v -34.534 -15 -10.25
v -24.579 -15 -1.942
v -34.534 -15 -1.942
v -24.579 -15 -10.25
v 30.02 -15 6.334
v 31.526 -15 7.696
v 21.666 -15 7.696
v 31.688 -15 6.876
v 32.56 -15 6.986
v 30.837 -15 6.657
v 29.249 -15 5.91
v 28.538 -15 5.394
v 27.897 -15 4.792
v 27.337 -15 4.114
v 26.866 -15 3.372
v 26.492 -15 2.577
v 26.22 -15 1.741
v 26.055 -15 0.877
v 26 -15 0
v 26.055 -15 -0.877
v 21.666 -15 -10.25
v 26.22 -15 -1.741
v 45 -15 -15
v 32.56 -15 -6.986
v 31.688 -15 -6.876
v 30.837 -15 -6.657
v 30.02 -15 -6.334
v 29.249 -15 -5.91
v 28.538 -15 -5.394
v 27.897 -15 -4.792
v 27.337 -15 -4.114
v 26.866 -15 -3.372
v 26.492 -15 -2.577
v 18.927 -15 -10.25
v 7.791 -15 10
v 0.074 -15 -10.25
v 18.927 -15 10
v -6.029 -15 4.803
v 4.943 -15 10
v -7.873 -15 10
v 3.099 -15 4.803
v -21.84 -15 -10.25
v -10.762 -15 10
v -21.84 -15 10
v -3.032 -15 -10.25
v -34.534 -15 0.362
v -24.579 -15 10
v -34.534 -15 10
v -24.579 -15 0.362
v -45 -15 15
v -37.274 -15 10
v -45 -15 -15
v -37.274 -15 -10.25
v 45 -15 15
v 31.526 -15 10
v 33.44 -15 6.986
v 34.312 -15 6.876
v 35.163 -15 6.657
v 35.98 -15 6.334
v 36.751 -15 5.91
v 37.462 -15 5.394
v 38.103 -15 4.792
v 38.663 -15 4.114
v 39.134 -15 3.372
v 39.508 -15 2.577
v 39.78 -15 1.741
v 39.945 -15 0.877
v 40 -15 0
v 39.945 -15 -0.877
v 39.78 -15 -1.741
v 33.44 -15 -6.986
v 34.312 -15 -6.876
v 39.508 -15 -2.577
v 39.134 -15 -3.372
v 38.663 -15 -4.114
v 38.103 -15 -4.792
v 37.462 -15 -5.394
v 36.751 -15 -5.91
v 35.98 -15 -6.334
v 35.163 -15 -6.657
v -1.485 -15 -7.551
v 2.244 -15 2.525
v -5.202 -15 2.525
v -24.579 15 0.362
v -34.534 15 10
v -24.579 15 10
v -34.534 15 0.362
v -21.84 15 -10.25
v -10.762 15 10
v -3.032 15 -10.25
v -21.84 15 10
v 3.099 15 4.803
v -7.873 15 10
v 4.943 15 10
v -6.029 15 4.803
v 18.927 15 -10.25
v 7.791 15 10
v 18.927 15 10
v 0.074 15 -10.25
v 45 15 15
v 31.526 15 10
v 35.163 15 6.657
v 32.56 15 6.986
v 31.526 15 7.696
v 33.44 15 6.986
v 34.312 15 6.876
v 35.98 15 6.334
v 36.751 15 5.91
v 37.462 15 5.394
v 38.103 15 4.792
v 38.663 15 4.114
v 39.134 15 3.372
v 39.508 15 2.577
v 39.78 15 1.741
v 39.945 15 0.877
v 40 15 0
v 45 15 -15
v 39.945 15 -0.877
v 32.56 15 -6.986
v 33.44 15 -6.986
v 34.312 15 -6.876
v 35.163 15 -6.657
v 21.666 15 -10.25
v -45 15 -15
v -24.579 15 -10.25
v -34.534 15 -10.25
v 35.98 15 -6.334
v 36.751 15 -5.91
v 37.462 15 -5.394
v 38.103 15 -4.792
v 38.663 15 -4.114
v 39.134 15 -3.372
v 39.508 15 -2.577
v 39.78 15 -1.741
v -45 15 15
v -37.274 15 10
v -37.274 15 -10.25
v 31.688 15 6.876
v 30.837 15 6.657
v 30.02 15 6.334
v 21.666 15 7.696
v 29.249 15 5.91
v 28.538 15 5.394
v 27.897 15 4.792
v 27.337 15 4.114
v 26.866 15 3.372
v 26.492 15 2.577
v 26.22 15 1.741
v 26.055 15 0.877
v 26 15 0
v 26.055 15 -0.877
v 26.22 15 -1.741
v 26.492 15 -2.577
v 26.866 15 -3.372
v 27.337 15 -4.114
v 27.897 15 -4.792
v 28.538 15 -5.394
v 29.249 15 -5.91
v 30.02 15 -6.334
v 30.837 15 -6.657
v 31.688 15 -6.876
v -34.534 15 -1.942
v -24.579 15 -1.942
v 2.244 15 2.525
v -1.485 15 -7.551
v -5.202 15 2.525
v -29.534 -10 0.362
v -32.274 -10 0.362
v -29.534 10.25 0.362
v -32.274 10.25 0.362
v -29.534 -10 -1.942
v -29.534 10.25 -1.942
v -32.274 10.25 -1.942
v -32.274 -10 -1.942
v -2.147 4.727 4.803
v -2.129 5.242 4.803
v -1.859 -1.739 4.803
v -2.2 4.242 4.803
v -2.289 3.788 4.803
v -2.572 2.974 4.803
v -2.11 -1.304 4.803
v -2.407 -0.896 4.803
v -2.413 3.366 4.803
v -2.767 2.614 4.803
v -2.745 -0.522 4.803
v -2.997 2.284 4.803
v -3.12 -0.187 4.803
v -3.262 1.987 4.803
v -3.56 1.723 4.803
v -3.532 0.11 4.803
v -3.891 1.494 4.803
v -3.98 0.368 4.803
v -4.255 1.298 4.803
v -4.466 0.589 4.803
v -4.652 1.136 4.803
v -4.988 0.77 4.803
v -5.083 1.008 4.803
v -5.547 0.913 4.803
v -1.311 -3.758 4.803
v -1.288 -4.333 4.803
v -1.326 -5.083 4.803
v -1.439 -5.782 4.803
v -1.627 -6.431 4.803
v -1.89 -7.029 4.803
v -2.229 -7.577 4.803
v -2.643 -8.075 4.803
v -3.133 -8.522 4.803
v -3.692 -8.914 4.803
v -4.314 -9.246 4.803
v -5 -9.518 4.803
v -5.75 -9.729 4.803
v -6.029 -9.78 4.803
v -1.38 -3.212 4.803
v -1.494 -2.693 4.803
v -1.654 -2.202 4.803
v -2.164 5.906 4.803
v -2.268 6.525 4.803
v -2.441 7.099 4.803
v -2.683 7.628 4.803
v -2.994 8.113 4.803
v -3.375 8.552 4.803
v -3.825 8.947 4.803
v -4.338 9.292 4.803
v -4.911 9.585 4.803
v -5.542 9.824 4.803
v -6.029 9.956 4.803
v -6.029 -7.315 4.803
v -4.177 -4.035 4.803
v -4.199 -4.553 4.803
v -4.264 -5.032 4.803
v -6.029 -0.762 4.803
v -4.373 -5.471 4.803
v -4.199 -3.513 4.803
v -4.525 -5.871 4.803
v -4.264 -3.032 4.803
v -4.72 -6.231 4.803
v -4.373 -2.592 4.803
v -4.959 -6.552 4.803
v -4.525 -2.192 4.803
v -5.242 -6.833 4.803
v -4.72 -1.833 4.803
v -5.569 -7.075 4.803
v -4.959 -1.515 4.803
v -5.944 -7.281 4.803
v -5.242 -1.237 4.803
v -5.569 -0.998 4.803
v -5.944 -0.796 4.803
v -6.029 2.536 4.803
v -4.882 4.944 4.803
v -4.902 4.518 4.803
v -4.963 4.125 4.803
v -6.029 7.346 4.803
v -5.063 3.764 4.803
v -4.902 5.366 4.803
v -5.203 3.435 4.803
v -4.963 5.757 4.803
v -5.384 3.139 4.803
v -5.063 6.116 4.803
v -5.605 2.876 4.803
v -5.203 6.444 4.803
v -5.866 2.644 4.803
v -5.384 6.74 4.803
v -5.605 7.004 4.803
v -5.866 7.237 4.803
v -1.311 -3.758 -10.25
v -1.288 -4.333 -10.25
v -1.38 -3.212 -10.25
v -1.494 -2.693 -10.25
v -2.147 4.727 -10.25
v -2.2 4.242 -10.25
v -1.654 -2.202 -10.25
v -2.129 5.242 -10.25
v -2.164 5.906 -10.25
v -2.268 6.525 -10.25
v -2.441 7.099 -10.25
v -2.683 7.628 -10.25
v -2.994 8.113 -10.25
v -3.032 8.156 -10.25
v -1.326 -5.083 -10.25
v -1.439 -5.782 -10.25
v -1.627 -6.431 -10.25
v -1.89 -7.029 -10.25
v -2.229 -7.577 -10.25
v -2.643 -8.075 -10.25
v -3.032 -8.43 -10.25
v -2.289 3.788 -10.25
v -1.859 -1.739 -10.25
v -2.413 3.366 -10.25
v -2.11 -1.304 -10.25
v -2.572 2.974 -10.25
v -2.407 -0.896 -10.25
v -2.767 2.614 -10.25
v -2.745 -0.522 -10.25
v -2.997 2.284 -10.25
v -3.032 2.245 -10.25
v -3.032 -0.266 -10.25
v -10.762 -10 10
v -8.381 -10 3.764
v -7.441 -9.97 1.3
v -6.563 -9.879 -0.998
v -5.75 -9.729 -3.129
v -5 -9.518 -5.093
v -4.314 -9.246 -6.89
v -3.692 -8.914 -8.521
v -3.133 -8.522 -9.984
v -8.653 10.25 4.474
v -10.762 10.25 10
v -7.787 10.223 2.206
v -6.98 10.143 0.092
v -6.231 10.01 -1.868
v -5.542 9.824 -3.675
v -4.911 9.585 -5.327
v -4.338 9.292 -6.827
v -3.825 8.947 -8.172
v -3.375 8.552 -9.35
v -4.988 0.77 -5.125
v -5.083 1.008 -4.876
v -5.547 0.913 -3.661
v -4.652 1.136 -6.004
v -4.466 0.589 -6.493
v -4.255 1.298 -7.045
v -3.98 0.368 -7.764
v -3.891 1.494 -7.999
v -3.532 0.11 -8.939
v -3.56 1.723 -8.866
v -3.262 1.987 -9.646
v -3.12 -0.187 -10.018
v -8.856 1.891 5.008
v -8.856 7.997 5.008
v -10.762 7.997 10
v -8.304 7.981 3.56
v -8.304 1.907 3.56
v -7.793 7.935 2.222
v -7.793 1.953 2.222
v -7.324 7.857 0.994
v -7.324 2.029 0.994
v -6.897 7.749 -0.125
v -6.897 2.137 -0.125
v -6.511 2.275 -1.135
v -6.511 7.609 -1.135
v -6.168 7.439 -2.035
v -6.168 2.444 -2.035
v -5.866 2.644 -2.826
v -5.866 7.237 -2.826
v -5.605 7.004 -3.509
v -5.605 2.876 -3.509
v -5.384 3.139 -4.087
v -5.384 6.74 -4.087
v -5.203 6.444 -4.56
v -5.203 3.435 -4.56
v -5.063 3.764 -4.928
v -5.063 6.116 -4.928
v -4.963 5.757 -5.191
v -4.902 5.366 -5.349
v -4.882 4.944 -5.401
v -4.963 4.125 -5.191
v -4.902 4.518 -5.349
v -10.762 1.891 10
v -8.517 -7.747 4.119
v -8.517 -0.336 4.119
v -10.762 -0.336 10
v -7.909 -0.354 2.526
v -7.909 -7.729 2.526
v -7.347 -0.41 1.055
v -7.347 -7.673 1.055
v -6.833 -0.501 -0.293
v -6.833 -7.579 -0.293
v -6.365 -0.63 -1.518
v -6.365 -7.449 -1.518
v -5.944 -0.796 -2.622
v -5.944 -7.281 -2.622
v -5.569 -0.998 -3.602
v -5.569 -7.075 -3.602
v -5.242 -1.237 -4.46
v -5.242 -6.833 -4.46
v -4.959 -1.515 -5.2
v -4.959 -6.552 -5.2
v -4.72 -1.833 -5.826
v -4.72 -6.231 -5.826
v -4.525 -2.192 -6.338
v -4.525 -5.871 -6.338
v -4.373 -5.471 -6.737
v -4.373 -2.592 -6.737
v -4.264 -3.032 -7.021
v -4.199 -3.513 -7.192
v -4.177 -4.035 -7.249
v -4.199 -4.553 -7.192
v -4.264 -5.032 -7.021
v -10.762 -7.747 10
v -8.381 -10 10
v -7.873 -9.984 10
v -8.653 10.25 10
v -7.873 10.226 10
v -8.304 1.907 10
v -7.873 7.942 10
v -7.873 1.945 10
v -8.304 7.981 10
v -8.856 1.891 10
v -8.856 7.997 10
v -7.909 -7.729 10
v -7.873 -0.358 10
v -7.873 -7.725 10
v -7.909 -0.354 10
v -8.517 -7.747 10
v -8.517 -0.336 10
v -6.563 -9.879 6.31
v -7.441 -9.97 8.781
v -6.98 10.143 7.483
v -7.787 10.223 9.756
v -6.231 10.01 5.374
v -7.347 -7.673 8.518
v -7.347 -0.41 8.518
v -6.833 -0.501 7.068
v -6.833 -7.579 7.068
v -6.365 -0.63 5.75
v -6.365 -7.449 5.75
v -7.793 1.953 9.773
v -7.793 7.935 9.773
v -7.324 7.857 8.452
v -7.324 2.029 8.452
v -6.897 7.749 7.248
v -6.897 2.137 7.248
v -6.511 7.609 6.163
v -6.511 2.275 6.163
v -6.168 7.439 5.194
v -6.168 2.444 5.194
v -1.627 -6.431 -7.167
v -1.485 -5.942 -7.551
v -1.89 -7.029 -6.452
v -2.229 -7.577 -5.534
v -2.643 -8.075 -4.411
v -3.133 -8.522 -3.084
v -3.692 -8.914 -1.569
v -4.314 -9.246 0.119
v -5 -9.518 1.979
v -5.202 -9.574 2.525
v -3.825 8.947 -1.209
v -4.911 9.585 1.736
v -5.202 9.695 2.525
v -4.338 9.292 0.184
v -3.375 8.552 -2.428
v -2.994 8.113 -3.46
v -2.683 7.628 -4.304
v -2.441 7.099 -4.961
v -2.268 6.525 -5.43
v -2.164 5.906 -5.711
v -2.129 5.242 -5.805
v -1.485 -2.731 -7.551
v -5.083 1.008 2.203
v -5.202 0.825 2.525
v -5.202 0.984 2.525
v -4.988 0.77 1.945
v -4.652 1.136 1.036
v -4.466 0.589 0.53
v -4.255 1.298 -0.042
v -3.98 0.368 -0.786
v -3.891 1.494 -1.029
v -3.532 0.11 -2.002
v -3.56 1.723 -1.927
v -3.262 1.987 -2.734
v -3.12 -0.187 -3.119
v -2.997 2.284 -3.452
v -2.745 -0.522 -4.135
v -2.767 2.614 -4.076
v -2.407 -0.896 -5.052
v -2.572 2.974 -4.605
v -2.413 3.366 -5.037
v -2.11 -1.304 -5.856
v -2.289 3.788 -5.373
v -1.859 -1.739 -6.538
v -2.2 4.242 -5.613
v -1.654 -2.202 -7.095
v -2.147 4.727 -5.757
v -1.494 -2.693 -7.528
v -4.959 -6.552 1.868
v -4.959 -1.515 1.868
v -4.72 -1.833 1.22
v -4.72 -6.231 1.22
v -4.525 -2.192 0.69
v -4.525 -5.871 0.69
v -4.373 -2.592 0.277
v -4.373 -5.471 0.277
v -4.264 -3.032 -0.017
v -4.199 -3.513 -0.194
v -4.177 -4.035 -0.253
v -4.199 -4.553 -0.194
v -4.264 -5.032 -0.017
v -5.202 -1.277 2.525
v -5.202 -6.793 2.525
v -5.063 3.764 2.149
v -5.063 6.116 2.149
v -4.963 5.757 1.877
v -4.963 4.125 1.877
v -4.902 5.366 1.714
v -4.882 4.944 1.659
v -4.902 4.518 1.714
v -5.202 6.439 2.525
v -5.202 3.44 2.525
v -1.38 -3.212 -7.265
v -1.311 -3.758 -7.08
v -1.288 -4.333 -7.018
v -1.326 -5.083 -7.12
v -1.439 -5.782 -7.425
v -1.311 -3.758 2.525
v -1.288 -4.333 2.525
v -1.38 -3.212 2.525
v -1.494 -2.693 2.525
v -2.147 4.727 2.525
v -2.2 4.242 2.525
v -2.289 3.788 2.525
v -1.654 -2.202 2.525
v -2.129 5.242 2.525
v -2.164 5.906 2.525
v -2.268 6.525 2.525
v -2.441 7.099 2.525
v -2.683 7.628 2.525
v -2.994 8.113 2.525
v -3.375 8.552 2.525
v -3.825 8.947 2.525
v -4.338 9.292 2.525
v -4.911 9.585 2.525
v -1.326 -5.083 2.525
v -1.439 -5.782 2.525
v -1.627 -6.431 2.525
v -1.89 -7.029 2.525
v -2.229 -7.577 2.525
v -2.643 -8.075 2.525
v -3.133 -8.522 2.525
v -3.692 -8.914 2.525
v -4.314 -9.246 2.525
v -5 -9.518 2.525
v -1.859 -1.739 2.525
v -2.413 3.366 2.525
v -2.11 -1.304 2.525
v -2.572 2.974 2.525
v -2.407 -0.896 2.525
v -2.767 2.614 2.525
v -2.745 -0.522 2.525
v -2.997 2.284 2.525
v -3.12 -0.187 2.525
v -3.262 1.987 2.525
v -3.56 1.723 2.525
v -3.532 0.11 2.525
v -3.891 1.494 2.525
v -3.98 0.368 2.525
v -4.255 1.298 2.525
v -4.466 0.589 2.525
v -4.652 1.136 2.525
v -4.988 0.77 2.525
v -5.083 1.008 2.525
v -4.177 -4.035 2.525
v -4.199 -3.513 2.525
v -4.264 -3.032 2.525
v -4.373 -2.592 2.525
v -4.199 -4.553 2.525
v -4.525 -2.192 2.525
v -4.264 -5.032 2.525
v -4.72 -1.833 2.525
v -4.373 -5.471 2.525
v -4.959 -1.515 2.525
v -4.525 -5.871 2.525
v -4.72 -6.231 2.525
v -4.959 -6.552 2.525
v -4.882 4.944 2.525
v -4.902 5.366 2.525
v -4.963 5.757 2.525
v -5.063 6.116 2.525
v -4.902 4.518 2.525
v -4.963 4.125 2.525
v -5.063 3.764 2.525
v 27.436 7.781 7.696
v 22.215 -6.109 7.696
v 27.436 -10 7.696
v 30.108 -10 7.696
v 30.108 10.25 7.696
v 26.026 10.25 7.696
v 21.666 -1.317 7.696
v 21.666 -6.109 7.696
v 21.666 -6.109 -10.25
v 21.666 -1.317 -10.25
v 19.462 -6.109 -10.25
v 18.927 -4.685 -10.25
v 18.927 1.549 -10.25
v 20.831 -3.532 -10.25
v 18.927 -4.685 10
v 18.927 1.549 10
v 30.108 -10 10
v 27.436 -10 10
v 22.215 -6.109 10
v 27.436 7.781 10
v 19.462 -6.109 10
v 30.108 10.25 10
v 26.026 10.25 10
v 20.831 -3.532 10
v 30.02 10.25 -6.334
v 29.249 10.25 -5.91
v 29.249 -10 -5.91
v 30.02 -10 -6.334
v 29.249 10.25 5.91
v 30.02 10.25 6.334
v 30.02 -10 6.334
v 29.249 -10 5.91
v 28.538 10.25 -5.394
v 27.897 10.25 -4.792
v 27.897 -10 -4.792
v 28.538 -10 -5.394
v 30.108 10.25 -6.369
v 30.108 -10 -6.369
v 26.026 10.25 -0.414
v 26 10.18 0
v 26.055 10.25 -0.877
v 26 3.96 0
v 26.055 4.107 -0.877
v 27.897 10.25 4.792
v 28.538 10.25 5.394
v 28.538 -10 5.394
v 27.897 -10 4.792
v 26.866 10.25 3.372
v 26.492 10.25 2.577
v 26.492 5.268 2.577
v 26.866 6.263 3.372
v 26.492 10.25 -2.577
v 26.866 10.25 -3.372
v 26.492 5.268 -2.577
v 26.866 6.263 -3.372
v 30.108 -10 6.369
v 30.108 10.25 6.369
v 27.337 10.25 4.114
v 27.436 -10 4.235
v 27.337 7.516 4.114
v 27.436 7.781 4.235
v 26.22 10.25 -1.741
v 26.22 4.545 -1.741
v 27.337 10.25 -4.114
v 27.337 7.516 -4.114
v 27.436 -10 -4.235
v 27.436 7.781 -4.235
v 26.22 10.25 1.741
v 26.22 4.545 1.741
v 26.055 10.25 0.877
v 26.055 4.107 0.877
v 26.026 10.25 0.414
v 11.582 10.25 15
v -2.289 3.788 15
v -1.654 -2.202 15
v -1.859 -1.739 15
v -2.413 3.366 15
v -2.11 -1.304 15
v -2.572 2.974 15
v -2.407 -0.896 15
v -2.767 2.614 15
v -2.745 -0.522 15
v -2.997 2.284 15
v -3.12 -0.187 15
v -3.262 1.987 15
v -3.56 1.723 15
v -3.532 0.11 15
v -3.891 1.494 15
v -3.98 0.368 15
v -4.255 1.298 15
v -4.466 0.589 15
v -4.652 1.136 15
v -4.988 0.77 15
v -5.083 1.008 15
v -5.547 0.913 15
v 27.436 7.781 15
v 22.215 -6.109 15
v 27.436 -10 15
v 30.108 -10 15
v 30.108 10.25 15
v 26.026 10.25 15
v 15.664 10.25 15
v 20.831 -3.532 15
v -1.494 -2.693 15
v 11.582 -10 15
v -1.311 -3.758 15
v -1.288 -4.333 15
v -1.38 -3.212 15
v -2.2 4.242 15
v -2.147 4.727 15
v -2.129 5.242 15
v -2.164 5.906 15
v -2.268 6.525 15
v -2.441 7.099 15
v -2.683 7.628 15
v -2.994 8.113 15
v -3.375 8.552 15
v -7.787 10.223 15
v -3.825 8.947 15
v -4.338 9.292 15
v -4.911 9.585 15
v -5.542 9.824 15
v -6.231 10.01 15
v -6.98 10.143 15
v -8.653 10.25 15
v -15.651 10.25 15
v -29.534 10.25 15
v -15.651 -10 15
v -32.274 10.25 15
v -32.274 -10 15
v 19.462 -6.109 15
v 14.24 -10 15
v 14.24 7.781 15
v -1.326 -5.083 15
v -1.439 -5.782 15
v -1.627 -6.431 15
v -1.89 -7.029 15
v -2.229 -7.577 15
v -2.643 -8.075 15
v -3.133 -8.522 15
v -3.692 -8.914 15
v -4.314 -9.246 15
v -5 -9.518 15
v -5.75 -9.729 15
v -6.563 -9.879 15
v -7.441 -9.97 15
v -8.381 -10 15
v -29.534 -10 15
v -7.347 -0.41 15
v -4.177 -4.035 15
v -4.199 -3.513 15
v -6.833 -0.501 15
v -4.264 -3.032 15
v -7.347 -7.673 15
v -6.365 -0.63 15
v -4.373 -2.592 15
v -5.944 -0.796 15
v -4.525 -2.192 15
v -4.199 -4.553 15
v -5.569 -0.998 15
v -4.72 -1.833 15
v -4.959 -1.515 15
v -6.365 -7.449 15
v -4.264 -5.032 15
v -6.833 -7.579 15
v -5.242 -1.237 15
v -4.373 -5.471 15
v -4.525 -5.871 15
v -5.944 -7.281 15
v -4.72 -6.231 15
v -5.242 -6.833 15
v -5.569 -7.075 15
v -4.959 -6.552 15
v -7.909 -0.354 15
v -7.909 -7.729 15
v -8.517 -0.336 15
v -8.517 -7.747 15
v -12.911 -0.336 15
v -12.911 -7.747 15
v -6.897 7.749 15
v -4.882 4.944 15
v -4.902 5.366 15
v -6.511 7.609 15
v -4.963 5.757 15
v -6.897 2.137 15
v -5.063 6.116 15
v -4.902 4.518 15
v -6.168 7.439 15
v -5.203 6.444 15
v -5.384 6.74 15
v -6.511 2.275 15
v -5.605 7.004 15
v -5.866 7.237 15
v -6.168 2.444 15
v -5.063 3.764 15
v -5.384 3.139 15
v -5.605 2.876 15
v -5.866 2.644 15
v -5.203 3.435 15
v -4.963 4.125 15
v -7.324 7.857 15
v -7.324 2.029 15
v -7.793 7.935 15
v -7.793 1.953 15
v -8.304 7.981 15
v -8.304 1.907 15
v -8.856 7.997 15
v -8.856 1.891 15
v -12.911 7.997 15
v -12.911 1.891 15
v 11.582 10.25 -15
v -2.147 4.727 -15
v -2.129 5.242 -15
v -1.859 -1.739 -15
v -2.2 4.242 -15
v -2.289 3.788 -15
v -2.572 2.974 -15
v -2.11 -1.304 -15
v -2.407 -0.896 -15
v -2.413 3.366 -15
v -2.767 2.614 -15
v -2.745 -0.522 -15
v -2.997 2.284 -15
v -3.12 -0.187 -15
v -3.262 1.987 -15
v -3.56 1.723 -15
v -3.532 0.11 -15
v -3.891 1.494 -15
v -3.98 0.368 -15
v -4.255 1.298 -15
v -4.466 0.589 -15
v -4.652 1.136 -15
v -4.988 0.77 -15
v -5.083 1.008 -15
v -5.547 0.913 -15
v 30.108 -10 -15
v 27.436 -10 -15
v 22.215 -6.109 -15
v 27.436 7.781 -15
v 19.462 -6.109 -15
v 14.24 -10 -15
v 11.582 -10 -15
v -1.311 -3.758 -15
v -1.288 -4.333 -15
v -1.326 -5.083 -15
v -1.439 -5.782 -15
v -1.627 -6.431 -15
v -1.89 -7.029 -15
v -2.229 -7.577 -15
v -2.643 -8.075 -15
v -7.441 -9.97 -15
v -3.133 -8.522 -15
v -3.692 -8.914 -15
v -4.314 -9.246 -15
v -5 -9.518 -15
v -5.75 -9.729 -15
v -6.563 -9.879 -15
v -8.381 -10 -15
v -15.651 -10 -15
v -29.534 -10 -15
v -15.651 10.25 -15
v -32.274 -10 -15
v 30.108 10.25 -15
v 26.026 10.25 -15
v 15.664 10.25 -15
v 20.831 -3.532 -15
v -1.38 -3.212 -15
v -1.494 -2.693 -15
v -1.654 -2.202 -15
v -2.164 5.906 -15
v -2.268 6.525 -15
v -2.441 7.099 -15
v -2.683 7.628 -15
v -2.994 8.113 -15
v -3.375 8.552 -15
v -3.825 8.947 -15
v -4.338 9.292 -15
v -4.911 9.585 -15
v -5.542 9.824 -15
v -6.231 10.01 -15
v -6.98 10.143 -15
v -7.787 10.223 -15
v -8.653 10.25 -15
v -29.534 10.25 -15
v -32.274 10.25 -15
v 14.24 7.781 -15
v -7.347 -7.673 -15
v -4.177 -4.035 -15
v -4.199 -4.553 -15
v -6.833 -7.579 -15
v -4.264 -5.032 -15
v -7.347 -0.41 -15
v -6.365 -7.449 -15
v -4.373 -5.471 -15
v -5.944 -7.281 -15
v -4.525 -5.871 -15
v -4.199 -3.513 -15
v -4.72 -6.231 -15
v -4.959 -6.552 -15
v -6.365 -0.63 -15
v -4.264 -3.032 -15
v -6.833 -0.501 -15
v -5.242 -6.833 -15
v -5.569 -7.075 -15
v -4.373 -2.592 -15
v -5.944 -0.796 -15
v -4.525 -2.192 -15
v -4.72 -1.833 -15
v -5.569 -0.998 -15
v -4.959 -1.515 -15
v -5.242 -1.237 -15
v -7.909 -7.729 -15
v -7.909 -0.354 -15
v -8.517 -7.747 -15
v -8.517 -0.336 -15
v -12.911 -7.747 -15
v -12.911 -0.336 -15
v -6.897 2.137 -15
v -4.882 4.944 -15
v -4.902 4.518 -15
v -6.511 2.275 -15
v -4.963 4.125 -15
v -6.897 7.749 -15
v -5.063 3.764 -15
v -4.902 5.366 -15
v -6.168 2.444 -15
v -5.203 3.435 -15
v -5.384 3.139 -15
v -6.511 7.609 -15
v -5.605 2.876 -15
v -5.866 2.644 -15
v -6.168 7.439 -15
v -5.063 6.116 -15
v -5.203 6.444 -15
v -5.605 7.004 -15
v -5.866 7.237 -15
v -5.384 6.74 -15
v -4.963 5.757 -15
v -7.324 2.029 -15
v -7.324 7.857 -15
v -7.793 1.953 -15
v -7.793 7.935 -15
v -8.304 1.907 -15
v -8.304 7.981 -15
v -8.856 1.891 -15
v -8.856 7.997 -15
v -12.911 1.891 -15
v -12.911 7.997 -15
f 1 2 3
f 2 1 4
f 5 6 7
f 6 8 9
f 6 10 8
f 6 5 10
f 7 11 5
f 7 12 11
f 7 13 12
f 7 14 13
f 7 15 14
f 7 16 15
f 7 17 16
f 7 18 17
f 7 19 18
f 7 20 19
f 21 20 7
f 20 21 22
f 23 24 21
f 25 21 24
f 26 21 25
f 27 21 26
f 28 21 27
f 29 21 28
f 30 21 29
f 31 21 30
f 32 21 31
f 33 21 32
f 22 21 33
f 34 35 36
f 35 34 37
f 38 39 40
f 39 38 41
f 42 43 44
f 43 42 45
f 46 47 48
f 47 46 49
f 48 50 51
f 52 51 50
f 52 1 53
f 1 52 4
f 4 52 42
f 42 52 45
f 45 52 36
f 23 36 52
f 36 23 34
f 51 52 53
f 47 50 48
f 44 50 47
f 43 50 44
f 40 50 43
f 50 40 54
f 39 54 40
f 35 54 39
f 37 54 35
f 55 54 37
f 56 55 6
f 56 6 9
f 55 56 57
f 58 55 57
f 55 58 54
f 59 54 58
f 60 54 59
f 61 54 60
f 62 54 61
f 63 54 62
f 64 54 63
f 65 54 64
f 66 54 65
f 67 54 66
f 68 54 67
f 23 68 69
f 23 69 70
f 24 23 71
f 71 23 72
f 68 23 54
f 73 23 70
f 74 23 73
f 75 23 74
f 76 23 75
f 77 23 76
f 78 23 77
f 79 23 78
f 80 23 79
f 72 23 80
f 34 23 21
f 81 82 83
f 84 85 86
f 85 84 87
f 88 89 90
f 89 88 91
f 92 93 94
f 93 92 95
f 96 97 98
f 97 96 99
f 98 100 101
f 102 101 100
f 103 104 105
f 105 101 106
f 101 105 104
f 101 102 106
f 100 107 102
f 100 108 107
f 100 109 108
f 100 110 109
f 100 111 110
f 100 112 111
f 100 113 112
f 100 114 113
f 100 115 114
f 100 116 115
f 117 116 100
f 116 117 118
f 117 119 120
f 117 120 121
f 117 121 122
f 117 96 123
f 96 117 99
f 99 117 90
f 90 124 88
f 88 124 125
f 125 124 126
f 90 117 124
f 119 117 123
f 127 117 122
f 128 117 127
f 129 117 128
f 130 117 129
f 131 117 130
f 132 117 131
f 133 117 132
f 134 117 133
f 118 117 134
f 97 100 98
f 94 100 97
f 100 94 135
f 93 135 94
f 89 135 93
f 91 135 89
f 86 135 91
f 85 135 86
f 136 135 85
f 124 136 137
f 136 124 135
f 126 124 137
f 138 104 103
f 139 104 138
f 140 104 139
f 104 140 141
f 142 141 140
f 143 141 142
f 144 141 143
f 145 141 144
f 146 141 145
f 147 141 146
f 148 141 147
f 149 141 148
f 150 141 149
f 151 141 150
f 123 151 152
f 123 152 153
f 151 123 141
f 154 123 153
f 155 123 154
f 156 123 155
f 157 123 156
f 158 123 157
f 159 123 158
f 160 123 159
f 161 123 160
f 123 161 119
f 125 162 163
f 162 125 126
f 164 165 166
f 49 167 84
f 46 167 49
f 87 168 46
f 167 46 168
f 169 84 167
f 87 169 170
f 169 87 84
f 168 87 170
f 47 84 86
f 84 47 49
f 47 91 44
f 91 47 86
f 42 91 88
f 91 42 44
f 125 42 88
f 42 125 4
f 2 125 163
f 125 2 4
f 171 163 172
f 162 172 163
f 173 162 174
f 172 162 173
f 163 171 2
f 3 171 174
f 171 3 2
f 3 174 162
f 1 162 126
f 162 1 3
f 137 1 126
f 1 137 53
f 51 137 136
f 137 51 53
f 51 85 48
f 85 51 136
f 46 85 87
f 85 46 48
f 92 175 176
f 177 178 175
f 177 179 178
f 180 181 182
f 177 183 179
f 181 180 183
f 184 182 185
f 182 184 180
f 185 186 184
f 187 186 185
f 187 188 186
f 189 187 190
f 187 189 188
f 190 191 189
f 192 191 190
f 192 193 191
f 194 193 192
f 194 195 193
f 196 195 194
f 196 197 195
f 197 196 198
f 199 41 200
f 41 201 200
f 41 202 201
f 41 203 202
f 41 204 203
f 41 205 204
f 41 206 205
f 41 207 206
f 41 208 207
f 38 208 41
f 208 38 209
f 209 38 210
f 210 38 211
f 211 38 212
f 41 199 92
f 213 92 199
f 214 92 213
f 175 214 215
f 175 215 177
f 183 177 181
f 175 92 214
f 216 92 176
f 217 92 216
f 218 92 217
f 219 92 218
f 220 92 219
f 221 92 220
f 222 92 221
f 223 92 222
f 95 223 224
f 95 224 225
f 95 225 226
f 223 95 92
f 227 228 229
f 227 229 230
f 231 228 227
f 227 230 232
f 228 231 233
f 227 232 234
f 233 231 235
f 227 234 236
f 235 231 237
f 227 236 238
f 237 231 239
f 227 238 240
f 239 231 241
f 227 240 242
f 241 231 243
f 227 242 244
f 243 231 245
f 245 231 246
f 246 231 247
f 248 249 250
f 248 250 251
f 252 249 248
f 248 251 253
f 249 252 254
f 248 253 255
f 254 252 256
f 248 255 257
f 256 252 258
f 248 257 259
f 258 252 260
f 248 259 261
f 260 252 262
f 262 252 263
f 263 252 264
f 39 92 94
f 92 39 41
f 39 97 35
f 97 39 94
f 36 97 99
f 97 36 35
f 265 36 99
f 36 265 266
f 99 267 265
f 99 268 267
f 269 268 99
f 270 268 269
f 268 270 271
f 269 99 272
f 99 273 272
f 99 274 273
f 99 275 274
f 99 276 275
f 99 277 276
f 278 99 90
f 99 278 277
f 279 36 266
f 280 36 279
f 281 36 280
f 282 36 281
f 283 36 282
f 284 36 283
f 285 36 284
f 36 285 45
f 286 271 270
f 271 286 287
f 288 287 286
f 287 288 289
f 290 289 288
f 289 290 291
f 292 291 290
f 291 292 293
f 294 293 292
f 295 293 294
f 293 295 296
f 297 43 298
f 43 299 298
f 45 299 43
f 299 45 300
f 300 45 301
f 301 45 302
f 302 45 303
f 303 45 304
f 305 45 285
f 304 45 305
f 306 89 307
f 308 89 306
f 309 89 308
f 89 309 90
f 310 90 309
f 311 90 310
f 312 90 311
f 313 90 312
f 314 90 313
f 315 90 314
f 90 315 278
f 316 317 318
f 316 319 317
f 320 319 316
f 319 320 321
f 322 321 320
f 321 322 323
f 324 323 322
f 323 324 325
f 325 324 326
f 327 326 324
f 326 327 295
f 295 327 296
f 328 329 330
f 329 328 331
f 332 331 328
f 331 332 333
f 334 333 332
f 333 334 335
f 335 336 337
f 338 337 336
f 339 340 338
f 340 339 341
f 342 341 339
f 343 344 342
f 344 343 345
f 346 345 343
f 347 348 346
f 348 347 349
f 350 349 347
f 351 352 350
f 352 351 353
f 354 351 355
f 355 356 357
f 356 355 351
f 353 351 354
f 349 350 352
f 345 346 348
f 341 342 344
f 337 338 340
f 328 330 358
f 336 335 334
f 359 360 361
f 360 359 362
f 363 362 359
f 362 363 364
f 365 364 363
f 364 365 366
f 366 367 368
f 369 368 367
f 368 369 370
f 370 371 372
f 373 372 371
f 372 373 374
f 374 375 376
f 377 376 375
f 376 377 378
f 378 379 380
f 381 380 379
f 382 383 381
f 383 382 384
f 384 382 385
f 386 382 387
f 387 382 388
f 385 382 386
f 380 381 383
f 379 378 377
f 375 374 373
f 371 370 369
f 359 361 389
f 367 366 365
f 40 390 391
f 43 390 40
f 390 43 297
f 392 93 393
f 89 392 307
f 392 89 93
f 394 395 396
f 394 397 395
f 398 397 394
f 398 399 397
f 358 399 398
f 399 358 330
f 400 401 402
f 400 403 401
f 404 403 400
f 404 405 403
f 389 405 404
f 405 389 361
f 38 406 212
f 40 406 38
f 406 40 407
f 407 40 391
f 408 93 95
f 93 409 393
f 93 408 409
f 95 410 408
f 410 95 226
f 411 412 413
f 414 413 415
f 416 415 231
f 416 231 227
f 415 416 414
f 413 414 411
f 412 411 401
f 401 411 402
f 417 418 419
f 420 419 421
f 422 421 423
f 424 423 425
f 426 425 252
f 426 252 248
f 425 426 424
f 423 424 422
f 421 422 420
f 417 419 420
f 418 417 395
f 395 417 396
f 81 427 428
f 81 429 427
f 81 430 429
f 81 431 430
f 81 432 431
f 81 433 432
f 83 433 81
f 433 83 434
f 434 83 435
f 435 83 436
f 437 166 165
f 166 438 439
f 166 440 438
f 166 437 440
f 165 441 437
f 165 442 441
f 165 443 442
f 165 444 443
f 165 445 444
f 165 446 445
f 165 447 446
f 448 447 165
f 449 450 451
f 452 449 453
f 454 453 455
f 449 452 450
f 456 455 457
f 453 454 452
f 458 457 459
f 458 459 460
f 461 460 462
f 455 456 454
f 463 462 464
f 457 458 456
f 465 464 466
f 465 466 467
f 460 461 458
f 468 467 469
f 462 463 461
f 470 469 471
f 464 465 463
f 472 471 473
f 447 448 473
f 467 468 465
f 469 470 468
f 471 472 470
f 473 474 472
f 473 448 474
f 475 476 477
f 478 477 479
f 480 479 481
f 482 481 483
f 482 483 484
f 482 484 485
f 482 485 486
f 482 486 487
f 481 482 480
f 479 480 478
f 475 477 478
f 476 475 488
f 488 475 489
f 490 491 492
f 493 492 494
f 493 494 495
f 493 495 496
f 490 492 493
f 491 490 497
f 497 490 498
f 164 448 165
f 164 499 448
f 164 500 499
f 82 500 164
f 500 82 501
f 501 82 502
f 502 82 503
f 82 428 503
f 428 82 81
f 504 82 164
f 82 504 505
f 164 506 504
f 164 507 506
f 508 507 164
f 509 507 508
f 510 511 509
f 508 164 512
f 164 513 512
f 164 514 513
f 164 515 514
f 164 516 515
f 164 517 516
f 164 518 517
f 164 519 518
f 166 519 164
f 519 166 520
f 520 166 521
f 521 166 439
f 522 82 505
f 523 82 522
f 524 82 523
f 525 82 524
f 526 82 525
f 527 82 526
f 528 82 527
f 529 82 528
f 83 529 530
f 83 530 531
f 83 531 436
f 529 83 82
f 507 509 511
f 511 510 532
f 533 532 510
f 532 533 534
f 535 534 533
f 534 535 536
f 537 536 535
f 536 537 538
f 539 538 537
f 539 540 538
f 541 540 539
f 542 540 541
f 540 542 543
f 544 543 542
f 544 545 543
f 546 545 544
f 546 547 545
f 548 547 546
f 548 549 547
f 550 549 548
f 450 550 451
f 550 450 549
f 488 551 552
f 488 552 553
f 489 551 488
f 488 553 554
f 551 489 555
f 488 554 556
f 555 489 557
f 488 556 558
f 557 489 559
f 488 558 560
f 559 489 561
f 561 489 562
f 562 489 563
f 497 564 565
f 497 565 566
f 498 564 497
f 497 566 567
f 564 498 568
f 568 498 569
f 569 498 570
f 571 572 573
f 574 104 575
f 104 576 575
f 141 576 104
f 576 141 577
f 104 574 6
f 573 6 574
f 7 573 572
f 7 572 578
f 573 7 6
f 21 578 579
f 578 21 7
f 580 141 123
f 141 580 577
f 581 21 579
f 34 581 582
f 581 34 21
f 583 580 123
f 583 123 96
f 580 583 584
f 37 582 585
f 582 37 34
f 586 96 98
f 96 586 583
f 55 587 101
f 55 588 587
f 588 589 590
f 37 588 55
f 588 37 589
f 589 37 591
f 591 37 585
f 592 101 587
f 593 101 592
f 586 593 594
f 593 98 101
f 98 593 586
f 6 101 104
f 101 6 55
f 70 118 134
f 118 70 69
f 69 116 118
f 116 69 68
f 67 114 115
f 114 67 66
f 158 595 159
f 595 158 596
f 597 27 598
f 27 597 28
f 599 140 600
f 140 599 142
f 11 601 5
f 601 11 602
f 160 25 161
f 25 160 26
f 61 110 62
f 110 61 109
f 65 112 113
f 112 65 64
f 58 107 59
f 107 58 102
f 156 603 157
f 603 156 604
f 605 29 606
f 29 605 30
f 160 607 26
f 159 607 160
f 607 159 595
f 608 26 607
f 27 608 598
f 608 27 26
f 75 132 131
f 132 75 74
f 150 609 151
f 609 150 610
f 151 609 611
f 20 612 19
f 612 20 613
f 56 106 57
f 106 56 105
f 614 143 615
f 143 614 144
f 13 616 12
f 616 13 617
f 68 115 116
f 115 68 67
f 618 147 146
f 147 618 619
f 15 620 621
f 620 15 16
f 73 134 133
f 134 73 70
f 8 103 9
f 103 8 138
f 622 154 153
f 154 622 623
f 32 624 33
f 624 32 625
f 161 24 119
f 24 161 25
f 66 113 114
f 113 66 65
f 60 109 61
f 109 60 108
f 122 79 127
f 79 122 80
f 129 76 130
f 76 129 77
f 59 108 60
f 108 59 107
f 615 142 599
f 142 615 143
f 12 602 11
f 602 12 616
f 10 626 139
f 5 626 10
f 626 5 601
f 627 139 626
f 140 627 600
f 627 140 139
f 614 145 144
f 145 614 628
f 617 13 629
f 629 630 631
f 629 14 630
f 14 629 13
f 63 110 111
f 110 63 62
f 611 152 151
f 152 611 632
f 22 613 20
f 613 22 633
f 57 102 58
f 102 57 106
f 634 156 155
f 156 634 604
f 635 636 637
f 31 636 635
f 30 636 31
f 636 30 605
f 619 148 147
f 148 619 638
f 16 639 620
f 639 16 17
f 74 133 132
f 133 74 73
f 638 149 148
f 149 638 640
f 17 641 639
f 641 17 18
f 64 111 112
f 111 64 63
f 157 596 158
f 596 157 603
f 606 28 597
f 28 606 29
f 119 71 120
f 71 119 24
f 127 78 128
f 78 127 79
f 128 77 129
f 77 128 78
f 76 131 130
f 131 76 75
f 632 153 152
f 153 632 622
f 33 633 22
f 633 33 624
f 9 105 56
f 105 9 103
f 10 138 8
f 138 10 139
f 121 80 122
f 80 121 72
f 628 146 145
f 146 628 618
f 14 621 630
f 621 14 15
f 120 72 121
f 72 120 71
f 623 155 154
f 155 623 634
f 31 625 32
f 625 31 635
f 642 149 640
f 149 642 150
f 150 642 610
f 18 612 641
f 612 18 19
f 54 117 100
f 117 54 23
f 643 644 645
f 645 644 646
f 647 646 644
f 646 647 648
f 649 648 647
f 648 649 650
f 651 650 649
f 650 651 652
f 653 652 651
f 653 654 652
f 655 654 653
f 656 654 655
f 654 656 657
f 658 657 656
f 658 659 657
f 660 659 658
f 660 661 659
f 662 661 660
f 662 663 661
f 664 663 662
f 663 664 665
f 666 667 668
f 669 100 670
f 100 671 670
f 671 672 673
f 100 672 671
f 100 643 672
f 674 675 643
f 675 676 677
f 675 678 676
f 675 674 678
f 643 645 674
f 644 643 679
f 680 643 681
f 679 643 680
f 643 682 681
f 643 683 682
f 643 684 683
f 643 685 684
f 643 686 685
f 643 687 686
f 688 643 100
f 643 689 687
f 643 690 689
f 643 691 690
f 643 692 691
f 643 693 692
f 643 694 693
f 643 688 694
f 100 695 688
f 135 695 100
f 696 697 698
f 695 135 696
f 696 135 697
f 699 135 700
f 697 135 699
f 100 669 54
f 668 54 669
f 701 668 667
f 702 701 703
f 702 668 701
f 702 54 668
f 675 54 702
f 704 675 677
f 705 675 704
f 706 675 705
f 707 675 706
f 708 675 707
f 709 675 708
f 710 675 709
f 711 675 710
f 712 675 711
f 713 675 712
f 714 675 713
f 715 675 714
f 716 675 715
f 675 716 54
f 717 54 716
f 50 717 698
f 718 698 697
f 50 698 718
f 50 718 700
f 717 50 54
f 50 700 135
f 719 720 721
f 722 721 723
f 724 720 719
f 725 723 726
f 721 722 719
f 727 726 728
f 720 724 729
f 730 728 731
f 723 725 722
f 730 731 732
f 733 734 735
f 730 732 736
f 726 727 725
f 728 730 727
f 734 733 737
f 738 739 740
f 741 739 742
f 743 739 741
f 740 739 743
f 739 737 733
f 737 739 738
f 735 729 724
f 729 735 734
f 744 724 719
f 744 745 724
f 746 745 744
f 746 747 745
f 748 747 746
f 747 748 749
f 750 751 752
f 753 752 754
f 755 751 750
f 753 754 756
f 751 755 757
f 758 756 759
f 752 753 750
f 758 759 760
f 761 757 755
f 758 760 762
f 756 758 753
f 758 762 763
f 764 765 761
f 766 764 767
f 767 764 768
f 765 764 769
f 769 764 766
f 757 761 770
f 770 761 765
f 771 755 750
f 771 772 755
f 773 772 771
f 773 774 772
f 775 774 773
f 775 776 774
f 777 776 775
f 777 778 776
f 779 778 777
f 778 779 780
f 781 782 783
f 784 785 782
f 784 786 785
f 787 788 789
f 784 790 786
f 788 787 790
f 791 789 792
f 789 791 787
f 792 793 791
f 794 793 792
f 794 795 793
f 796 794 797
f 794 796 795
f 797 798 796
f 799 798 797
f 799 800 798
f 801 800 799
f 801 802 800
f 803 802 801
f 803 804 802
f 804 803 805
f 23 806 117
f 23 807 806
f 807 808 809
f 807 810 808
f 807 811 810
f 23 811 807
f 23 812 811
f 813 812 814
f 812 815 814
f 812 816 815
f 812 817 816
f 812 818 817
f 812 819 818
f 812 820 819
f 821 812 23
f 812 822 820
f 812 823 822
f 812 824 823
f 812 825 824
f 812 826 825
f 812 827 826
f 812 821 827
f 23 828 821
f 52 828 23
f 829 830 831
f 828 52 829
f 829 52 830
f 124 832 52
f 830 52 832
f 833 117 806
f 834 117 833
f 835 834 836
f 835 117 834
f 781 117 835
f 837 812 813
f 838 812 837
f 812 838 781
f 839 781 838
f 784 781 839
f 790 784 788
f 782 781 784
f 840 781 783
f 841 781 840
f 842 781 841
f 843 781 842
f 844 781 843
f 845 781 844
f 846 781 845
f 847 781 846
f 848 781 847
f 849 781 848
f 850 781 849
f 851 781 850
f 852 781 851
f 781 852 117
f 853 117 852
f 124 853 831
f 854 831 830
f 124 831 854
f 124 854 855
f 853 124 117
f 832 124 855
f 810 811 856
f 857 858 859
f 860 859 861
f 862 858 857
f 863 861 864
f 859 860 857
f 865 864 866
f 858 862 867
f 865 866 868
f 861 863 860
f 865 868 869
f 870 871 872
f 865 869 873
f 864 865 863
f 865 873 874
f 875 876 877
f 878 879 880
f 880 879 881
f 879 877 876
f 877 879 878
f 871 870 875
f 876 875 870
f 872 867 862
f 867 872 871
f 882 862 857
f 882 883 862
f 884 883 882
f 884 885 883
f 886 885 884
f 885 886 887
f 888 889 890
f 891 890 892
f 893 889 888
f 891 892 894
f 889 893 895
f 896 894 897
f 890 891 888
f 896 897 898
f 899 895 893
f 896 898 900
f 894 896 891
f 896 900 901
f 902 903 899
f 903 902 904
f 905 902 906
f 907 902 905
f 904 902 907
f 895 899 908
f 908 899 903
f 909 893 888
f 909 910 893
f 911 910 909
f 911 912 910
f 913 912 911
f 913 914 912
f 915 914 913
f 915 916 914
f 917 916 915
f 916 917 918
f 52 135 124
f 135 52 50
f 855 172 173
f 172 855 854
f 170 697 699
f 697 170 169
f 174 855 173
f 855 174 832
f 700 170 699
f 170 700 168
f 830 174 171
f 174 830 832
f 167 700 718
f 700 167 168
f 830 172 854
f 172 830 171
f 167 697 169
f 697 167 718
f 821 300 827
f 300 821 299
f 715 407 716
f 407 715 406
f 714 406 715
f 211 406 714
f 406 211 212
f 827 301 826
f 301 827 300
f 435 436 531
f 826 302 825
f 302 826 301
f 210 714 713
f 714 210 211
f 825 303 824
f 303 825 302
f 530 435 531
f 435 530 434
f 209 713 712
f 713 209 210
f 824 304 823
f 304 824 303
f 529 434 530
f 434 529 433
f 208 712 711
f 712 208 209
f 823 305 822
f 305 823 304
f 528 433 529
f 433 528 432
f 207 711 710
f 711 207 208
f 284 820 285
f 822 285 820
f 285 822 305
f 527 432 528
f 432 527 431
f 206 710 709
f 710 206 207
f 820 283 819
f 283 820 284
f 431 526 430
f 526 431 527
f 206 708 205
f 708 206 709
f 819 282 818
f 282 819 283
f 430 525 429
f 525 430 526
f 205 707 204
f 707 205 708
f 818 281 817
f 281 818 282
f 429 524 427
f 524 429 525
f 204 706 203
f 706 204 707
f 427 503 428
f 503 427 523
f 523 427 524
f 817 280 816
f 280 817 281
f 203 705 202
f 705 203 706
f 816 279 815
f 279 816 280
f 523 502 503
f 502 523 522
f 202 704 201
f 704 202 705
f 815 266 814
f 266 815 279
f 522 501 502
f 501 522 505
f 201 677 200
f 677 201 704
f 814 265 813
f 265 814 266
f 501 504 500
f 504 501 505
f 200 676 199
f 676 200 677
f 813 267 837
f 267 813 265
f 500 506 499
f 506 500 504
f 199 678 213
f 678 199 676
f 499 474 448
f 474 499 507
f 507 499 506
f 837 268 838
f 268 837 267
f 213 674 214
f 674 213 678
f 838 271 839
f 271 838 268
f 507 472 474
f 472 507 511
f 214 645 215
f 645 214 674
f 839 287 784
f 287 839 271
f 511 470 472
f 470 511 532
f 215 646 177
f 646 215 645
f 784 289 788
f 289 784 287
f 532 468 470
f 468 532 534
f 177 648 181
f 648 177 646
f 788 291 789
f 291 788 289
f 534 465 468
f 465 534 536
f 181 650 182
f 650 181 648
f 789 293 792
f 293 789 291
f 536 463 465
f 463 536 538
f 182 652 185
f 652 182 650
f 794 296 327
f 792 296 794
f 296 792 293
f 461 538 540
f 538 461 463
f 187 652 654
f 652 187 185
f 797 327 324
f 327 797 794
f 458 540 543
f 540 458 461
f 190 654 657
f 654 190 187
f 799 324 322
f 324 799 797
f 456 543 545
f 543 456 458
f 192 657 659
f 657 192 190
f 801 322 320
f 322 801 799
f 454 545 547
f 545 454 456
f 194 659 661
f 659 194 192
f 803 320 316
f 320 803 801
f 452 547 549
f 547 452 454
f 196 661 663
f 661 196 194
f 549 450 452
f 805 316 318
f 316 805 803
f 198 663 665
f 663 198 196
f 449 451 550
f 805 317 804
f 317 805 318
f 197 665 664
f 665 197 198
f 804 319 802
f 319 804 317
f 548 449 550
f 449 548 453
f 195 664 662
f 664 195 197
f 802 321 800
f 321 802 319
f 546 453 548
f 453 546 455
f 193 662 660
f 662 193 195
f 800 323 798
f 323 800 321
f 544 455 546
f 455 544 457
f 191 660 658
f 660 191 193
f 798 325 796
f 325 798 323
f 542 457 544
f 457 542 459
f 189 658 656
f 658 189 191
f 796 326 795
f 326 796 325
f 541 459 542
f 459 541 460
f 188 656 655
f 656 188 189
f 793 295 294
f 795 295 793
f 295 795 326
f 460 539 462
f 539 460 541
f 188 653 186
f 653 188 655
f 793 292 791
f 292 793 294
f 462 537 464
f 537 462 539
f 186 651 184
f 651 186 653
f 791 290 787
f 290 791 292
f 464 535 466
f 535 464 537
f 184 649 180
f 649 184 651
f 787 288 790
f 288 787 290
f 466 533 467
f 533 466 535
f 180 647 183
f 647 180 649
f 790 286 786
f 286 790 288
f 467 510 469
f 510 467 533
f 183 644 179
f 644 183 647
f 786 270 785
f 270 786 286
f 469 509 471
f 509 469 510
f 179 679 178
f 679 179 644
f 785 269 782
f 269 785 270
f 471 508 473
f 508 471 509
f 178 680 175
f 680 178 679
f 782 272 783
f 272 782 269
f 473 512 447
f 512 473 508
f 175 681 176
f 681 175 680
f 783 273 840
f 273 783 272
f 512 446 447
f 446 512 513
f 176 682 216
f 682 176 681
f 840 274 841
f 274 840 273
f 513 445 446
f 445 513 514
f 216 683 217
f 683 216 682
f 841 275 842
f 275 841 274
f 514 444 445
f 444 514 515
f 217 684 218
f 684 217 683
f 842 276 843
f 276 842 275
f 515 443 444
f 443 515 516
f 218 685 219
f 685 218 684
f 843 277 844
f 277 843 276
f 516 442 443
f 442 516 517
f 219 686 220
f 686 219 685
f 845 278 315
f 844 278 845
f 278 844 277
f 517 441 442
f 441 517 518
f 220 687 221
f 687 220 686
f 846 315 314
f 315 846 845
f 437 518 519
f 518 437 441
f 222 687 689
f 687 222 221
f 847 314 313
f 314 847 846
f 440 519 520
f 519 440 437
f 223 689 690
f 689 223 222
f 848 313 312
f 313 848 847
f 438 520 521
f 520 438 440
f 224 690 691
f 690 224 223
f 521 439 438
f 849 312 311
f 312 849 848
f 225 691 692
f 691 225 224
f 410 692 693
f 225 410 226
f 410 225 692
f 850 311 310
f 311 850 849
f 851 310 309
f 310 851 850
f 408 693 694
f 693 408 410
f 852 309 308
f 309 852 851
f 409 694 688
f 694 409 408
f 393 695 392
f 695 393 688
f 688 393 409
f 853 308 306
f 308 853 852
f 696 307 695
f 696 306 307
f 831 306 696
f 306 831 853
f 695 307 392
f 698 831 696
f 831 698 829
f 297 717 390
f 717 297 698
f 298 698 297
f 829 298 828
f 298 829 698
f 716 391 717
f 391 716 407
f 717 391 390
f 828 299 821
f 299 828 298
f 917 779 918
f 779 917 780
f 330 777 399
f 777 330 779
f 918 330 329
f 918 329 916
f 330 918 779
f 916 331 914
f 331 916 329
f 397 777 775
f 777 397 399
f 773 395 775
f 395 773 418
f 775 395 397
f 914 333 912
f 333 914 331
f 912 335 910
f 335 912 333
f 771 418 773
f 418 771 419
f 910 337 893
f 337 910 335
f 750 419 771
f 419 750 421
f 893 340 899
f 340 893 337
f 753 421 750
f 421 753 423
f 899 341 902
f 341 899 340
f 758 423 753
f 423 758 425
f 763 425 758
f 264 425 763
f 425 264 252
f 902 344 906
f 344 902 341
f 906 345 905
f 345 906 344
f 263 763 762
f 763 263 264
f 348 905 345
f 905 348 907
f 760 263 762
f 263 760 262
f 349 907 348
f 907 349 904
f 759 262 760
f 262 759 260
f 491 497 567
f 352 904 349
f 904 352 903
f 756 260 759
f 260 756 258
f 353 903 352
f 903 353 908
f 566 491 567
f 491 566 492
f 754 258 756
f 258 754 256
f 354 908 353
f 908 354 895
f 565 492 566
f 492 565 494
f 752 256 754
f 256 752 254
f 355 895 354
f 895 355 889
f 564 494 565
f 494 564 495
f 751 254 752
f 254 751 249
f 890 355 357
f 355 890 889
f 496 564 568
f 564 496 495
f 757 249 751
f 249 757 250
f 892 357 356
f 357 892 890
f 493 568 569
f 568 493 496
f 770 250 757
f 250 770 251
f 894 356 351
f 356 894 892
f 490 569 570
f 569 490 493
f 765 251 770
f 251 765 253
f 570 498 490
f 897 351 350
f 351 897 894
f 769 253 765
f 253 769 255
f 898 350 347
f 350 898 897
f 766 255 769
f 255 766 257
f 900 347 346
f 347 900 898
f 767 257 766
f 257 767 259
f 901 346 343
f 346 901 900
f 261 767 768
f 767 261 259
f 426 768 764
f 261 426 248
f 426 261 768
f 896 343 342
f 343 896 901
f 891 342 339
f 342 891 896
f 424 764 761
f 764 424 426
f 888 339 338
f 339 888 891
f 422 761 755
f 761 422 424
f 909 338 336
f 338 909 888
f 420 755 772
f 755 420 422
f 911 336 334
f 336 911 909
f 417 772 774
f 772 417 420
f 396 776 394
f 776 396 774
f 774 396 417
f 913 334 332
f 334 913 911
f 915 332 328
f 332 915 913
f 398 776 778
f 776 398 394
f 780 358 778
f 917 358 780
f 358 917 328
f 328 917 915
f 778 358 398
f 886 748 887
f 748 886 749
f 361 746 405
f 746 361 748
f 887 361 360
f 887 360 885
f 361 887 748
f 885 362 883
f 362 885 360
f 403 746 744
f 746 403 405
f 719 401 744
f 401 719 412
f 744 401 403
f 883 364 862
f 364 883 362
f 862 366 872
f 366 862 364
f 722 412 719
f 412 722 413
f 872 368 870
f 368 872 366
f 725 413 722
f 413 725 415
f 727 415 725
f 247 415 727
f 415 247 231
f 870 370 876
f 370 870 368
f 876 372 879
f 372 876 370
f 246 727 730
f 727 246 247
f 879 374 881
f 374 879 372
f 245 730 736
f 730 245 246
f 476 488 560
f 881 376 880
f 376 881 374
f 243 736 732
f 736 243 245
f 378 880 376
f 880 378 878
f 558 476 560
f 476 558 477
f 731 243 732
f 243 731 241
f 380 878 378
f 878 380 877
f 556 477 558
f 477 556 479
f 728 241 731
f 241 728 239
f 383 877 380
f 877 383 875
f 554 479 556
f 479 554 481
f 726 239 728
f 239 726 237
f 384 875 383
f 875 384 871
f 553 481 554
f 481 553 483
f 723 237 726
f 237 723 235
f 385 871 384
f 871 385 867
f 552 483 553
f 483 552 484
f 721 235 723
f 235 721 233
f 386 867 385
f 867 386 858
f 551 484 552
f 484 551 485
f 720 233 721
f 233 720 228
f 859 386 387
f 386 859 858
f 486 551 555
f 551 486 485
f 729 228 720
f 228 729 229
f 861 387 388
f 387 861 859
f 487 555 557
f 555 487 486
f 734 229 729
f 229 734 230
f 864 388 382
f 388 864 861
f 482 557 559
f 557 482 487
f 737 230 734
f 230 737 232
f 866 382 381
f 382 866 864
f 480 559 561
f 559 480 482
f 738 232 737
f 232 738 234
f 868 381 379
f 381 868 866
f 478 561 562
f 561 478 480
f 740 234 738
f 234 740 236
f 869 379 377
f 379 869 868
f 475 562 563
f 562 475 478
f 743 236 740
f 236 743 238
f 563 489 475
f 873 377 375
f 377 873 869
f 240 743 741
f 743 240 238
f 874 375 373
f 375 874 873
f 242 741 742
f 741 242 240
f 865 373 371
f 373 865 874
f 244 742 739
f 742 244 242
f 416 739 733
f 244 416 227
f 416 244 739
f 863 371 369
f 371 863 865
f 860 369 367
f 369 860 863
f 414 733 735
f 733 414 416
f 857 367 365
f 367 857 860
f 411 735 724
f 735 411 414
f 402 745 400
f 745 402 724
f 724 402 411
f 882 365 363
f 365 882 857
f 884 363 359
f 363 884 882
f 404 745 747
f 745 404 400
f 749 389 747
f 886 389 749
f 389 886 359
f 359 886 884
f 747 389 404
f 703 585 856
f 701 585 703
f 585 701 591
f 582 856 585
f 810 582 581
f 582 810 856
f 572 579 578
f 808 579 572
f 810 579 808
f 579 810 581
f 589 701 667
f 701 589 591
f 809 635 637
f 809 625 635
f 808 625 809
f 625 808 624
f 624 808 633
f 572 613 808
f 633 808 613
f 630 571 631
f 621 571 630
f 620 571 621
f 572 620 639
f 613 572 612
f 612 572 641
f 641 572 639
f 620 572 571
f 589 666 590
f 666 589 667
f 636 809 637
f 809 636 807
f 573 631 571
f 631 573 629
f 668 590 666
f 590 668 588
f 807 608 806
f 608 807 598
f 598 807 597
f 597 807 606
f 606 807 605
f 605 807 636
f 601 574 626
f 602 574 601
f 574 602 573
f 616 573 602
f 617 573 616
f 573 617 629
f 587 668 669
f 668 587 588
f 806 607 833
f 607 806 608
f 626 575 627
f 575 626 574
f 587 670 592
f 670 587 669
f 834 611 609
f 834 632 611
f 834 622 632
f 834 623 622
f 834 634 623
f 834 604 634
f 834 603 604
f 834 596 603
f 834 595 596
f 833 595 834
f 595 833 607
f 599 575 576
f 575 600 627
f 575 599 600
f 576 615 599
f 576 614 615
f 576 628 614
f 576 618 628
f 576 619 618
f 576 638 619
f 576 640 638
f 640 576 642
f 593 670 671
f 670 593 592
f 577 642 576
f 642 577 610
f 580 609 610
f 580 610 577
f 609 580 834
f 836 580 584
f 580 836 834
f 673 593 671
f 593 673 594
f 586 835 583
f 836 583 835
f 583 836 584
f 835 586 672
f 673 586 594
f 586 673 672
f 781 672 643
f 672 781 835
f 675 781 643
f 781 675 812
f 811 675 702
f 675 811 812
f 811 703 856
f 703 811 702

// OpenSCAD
cl=200;
cw=10;
ch=20;
n=8;

// IBM font is Menin Blue
// should install for all users
// for HAL: Fog Sans style outline

module stripes() {
for(i=[0:n-1]) {
  translate([0,i*cw*2,0])
    cube([cl,cw,ch]);
}
}

module IBM() {
translate([10,5,-10])
//rotate([45,0,0])
linear_extrude(50)
text( "I B M",size=20,font="MeninBlue:style=Normal" , $fn=50);
}

module HAL() {
translate([5,0,25])
rotate([-90,0,0]) {
linear_extrude(30)
text( "H A L" ,size=20,font="Fog Sans:style=Outline" , $fn=50);
translate([73,10,-5])
cylinder(d=14,h=40,$fn=50);
}    
}

//Arial Black:style=Bold

module build() {
difference(){
  cube([90,30,30]);
  HAL();
  IBM();
}
}

translate([-45,-15,-15])
build();
